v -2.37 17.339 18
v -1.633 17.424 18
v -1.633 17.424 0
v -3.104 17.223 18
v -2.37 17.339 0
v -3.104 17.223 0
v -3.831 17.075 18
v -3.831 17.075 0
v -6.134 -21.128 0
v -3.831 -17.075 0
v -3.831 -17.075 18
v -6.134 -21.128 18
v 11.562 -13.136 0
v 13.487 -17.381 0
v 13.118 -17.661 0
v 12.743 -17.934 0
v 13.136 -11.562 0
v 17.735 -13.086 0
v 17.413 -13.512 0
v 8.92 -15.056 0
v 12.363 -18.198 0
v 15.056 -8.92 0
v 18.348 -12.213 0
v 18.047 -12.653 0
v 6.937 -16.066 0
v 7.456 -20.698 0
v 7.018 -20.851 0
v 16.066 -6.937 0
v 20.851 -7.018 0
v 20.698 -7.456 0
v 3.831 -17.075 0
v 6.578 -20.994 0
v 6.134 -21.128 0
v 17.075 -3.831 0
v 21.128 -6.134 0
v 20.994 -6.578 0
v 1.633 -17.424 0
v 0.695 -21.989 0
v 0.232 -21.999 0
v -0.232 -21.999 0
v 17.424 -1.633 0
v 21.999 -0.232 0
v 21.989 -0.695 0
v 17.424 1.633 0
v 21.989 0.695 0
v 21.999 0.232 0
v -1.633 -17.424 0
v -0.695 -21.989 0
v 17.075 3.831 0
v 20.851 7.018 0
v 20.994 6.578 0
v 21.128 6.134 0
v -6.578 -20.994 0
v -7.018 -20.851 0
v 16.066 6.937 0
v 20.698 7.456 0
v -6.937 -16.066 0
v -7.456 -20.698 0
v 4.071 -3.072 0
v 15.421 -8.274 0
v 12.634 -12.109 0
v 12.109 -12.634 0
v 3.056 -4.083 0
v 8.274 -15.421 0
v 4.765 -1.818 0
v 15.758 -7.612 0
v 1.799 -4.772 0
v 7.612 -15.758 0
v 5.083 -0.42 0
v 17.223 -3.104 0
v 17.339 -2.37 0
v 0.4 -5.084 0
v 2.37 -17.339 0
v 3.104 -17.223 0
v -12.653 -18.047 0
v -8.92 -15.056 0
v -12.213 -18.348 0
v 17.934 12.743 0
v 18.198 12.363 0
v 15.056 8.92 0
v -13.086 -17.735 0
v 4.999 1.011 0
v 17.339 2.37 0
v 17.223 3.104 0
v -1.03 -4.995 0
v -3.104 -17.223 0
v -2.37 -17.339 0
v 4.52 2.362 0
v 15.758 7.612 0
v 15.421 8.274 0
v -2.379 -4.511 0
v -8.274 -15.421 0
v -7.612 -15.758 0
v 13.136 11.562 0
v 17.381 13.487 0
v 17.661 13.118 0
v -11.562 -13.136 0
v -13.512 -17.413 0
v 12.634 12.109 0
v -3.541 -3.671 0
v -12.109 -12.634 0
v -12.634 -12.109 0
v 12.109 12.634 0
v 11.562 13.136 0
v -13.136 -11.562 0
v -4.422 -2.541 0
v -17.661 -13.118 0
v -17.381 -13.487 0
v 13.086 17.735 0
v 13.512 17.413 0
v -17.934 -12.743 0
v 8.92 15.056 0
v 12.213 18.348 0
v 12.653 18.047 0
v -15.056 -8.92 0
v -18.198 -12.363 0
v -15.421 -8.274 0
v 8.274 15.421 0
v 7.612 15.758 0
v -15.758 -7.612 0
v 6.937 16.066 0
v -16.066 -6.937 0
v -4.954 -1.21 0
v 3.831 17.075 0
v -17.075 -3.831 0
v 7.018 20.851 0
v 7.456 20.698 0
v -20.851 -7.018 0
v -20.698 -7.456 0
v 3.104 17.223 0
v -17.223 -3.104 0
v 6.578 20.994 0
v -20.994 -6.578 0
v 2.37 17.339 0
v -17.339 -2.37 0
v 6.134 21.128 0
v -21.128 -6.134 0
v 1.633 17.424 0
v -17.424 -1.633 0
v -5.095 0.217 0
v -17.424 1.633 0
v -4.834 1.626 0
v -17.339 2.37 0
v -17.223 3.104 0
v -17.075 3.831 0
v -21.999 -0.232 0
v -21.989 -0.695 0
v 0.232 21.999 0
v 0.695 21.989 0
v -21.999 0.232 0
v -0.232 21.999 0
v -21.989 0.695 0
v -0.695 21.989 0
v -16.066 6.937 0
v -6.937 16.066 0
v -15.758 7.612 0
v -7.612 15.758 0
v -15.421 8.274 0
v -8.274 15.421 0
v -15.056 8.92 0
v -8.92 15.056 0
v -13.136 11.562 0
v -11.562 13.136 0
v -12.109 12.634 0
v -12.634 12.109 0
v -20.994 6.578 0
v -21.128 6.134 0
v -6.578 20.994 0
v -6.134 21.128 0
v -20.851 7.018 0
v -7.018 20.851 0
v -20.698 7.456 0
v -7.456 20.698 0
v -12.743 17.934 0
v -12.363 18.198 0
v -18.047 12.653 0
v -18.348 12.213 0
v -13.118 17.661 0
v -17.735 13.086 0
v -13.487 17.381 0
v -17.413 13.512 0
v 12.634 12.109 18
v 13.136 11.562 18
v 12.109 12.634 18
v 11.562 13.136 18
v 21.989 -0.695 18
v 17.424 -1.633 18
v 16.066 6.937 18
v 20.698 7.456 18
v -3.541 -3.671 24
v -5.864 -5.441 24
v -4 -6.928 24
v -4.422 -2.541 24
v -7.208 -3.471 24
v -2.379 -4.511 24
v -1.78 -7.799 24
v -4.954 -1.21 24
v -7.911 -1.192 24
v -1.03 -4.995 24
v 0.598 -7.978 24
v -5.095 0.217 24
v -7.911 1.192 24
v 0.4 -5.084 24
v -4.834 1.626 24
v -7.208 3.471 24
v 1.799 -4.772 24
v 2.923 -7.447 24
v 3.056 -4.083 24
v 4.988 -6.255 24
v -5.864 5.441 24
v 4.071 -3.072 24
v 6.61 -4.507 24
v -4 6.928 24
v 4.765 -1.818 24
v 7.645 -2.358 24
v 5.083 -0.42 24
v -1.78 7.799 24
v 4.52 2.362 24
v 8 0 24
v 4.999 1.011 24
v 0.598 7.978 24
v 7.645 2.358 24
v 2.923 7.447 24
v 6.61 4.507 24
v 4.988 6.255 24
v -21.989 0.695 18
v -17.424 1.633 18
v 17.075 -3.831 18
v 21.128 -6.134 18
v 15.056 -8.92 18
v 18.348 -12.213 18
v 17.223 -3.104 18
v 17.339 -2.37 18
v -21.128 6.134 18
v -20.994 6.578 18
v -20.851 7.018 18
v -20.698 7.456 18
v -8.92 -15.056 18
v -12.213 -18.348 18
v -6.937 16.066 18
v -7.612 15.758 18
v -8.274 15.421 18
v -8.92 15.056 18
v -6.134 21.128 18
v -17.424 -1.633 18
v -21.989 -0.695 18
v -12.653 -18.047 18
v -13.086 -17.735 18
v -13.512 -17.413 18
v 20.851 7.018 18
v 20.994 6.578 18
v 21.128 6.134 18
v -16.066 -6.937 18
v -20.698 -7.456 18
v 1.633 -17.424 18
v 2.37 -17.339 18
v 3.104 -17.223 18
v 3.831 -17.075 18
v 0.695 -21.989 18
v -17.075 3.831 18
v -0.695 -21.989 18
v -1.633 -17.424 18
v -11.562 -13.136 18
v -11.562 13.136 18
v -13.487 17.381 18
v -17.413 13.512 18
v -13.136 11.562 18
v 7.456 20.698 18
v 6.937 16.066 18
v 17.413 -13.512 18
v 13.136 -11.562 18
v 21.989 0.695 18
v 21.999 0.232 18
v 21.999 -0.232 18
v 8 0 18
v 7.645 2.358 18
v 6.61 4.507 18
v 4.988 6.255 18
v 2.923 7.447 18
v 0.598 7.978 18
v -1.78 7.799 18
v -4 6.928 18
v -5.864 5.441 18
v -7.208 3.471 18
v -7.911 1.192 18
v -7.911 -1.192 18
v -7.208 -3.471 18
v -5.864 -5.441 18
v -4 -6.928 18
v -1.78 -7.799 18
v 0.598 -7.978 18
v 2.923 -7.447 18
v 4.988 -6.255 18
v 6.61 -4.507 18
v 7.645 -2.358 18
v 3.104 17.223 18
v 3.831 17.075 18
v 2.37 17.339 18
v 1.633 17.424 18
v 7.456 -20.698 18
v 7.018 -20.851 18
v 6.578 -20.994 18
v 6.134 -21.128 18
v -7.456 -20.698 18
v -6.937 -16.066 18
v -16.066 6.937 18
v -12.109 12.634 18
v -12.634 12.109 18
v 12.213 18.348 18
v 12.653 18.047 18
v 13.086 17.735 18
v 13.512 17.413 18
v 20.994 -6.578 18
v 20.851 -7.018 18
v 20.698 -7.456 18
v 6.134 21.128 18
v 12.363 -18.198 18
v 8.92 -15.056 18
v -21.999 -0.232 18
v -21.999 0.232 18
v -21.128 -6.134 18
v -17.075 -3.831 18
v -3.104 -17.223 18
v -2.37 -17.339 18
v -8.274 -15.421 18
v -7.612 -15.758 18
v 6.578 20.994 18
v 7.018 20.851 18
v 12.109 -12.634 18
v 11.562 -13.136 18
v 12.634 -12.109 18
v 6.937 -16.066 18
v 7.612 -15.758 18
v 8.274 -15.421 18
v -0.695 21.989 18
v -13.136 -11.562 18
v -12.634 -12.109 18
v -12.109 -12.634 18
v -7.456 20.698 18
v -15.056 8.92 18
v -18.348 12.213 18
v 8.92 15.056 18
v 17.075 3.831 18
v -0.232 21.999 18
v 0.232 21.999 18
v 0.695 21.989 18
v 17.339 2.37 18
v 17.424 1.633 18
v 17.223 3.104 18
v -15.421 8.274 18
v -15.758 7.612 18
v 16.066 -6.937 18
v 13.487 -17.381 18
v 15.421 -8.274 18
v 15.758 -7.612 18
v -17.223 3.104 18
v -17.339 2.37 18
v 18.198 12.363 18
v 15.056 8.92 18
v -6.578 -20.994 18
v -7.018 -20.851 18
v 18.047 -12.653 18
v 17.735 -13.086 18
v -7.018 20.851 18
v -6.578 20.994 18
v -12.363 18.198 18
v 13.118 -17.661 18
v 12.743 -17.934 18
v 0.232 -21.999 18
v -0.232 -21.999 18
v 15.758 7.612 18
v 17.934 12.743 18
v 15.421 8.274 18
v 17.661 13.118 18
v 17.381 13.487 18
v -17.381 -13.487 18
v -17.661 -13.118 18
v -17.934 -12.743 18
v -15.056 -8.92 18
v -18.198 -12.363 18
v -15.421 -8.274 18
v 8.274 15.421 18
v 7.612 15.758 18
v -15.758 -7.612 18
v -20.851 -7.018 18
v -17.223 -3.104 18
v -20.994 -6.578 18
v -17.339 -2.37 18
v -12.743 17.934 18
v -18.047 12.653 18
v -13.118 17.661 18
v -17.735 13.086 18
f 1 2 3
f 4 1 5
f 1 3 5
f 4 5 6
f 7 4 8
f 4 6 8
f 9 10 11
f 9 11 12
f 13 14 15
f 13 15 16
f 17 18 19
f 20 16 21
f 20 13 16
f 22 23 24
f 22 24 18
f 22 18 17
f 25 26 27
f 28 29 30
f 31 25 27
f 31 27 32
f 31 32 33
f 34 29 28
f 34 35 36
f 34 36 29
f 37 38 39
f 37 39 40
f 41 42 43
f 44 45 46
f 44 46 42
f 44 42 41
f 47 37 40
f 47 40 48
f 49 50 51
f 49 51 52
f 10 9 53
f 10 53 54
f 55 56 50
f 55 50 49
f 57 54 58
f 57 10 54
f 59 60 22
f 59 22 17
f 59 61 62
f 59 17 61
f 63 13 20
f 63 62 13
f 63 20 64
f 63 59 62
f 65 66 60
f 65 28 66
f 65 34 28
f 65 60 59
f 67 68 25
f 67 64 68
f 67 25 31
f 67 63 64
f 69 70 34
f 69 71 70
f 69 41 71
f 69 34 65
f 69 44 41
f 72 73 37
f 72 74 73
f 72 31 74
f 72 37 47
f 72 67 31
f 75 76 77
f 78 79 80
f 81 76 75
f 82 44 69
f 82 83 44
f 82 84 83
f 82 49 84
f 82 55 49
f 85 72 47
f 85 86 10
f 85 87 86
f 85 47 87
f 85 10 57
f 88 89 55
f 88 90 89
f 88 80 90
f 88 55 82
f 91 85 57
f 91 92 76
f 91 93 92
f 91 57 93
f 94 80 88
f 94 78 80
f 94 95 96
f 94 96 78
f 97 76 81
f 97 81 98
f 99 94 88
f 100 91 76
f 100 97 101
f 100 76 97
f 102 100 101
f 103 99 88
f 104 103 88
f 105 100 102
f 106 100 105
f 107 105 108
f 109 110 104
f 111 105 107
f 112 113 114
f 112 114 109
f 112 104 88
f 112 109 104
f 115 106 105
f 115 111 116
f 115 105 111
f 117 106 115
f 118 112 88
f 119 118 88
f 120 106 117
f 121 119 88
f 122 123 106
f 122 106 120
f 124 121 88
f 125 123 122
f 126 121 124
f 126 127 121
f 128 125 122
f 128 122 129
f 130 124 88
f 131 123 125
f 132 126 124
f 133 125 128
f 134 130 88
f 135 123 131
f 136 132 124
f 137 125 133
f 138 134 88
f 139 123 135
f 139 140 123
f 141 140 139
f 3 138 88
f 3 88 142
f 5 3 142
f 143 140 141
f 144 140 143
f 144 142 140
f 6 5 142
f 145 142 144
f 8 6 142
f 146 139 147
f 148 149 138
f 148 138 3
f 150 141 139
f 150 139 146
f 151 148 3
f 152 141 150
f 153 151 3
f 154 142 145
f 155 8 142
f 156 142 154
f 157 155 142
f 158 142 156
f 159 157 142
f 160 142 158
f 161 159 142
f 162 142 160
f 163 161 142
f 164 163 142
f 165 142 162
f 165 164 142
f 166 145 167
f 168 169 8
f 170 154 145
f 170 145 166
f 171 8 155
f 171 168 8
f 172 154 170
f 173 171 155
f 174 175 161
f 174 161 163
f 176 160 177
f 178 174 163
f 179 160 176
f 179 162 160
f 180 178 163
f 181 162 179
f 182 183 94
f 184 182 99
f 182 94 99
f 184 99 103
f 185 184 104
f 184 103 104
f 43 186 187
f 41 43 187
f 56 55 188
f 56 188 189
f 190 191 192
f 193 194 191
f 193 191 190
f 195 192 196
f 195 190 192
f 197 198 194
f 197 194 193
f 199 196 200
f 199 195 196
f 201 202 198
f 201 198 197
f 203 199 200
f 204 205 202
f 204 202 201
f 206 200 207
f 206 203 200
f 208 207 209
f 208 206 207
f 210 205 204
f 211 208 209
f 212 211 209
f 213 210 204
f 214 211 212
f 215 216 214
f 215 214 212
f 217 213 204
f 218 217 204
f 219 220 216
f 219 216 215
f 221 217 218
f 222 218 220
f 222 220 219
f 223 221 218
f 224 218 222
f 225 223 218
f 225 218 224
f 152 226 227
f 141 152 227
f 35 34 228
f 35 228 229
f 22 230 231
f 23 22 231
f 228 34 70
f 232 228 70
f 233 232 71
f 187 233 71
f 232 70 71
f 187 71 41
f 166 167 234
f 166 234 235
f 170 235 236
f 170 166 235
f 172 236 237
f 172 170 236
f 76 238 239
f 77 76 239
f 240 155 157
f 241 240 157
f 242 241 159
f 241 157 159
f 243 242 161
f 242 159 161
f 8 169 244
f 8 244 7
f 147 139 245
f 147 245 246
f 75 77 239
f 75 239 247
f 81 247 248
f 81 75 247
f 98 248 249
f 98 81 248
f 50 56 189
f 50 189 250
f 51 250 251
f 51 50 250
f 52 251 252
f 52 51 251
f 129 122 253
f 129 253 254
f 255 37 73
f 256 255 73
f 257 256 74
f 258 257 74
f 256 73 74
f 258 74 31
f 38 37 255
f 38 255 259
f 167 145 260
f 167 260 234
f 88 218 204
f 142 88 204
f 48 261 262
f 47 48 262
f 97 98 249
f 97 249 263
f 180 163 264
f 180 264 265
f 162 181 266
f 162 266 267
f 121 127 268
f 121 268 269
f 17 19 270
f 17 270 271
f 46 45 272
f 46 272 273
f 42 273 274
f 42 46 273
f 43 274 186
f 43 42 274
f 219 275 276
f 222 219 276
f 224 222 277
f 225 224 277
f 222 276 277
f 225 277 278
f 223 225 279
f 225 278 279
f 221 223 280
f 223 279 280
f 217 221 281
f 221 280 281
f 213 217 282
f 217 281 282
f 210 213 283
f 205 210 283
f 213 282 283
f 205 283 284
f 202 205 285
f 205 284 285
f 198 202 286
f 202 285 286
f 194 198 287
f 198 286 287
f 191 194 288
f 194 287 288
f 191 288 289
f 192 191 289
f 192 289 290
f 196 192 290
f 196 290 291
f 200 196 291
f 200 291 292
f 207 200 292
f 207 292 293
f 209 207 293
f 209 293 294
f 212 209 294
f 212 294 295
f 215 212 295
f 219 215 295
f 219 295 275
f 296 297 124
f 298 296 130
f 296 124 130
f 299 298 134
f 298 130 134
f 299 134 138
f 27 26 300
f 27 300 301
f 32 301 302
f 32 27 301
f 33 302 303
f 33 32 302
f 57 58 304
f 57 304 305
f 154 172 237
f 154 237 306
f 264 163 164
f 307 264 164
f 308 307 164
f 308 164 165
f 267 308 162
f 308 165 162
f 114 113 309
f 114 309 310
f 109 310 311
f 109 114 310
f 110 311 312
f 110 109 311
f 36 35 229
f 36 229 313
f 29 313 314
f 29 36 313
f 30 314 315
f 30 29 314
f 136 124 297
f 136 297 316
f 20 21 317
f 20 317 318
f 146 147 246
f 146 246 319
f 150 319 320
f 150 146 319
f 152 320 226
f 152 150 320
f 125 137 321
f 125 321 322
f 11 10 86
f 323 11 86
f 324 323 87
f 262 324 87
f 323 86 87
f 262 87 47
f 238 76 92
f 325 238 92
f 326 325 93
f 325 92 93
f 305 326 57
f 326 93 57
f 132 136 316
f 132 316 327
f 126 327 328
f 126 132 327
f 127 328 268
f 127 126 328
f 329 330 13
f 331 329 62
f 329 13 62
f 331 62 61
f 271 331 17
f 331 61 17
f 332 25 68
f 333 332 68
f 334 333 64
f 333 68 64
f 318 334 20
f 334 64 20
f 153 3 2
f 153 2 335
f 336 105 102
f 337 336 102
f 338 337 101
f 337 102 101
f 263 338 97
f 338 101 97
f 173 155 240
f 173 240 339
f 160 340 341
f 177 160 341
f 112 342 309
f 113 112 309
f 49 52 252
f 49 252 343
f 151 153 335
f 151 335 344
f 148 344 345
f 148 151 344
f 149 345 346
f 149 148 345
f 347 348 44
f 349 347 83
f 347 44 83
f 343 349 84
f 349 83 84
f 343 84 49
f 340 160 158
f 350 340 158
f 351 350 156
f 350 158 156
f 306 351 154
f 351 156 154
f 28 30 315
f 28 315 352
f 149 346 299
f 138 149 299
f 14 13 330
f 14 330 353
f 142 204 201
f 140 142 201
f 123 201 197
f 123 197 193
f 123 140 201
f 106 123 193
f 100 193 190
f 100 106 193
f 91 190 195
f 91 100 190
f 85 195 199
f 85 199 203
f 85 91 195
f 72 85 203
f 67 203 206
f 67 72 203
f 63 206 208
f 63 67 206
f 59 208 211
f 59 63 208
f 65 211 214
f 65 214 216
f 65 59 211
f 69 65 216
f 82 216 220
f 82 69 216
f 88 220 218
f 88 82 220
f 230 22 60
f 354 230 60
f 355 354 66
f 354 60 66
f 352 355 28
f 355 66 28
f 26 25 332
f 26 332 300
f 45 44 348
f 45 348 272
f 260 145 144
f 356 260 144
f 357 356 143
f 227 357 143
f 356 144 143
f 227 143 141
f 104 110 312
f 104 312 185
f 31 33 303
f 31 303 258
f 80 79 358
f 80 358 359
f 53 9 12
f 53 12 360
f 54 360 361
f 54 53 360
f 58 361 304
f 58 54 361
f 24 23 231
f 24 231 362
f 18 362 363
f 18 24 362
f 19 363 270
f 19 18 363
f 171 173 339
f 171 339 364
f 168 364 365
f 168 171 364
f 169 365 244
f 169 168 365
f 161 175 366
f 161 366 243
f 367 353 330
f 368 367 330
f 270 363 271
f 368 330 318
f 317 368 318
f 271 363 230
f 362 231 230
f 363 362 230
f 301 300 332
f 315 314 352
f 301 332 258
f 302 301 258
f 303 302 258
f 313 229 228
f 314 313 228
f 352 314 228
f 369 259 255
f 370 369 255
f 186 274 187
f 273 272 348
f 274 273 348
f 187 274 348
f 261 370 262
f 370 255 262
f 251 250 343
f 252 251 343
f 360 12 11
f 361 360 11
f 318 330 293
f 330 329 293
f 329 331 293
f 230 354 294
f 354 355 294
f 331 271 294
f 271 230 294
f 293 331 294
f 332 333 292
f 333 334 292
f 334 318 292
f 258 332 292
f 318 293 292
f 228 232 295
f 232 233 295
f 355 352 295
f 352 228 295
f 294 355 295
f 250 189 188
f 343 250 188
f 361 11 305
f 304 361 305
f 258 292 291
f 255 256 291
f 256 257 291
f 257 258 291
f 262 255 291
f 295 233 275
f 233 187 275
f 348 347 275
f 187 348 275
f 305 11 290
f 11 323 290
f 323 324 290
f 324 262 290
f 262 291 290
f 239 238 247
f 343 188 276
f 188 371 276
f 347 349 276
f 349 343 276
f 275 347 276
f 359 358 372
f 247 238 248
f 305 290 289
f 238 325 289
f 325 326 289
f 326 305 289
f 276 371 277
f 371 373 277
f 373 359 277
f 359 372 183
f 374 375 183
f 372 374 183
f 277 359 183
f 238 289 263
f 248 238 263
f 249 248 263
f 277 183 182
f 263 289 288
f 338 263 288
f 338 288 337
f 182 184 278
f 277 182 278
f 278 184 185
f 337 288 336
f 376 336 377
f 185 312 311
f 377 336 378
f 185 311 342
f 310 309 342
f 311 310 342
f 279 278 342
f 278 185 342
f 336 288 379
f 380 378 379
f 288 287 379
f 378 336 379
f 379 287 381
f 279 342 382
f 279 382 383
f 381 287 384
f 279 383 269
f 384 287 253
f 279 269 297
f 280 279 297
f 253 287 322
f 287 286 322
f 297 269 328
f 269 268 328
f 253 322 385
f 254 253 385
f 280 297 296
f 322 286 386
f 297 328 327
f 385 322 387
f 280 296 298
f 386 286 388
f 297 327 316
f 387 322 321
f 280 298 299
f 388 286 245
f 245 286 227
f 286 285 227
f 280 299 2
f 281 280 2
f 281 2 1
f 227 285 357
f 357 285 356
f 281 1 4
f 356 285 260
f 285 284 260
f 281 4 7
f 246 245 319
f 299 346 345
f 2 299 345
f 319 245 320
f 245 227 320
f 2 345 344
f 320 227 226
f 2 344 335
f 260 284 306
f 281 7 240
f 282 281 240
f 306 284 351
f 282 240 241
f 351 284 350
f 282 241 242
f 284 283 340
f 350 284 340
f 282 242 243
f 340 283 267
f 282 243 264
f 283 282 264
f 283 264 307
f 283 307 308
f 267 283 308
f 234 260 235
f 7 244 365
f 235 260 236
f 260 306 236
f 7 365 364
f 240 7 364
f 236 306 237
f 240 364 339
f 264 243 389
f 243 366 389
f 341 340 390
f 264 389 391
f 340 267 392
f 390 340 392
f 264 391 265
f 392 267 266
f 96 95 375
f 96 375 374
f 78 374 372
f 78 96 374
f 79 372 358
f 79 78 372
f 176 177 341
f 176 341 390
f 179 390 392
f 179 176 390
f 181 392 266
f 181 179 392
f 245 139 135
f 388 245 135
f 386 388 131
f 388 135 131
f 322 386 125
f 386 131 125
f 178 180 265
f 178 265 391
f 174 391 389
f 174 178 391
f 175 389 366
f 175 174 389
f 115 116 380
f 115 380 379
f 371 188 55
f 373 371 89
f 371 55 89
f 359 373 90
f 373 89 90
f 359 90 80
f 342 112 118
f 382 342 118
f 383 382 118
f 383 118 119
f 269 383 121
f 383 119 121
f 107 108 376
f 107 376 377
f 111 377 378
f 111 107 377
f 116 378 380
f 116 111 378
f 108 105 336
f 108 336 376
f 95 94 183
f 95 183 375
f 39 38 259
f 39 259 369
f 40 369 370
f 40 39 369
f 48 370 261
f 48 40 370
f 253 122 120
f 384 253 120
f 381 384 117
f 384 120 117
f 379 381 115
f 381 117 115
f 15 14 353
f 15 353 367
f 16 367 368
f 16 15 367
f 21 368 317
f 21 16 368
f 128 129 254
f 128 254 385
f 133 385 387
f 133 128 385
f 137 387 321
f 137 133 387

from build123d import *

# Parameters (mm, degrees)
SKETCH_1_R       = 8
EXTRUDE_1_DEPTH  = 24
SKETCH_2_R       = 17.5
SKETCH_2_R_2     = 8
EXTRUDE_2_DEPTH  = 18
EXTRUDE_3_DEPTH  = 18
EXTRUDE_4_DEPTH  = 18
EXTRUDE_5_DEPTH  = 18
EXTRUDE_6_DEPTH  = 18
EXTRUDE_7_DEPTH  = 18
EXTRUDE_8_DEPTH  = 18
EXTRUDE_9_DEPTH  = 18
EXTRUDE_10_DEPTH = 18
EXTRUDE_11_DEPTH = 18
EXTRUDE_12_DEPTH = 18
EXTRUDE_13_DEPTH = 18
EXTRUDE_14_DEPTH = 18
EXTRUDE_15_DEPTH = 18
EXTRUDE_16_DEPTH = 18
EXTRUDE_17_DEPTH = 18
EXTRUDE_18_DEPTH = 18
EXTRUDE_19_DEPTH = 18
EXTRUDE_20_DEPTH = 18
EXTRUDE_21_DEPTH = 18
EXTRUDE_22_DEPTH = 18


with BuildPart() as part:
    # 草图1 → 凸台-拉伸1 (new body)
    with BuildSketch(Plane.XY):
        Circle(SKETCH_1_R)
        with BuildLine():
            Line((4.520101179, 2.361924075), (-4.833937562, 1.62574526))
            ThreePointArc((-4.833937562, 1.62574526), (0.400141388, -5.084278402), (4.520101179, 2.361924075))
        make_face(mode=Mode.SUBTRACT)
    extrude(amount=EXTRUDE_1_DEPTH)

    # 草图2 → 凸台-拉伸2 (add)
    with BuildSketch(Plane.XY):
        Circle(SKETCH_2_R)
        Circle(SKETCH_2_R_2, mode=Mode.SUBTRACT)
    extrude(amount=EXTRUDE_2_DEPTH)

    # 草图3 → 凸台-拉伸3 (add)
    with BuildSketch(Plane.XY):
        with BuildLine():
            Line((17.423652167, 1.632894724), (21.989026862, 0.69476445))
            ThreePointArc((21.989026862, 0.69476445), (22, 0), (21.989026862, -0.69476445))
            Line((21.989026862, -0.69476445), (17.423652167, -1.632894724))
            ThreePointArc((17.423652167, -1.632894724), (17.5, 0), (17.423652167, 1.632894724))
        make_face()
    extrude(amount=EXTRUDE_3_DEPTH)

    # 草图4 → 凸台-拉伸4 (add)
    with BuildSketch(Plane.XY):
        with BuildLine():
            Line((16.066285711, 6.937179791), (20.698113262, 7.455743248))
            ThreePointArc((20.698113262, 7.455743248), (20.923243358, 6.798373876), (21.127501307, 6.134222733))
            Line((21.127501307, 6.134222733), (17.07547015, 3.831229456))
            ThreePointArc((17.07547015, 3.831229456), (16.643489035, 5.407797402), (16.066285711, 6.937179791))
        make_face()
    extrude(amount=EXTRUDE_4_DEPTH)

    # 草图5 → 凸台-拉伸5 (add)
    with BuildSketch(Plane.XY):
        with BuildLine():
            Line((13.13623927, 11.562405366), (17.381124124, 13.486901949))
            ThreePointArc((17.381124124, 13.486901949), (17.798373876, 12.93127555), (18.197868719, 12.362749455))
            Line((18.197868719, 12.362749455), (15.055822144, 8.920326203))
            ThreePointArc((15.055822144, 8.920326203), (14.157797402, 10.286241915), (13.13623927, 11.562405366))
        make_face()
    extrude(amount=EXTRUDE_5_DEPTH)

    # 草图6 → 凸台-拉伸6 (add)
    with BuildSketch(Plane.XY):
        with BuildLine():
            Line((8.920326203, 15.055822144), (12.212561116, 18.348057057))
            ThreePointArc((12.212561116, 18.348057057), (12.870731845, 17.892515435), (13.511927681, 17.413375811))
            Line((13.511927681, 17.413375811), (11.562405366, 13.13623927))
            ThreePointArc((11.562405366, 13.13623927), (10.286241915, 14.157797402), (8.920326203, 15.055822144))
        make_face()
    extrude(amount=EXTRUDE_6_DEPTH)

    # 草图7 → 凸台-拉伸7 (add)
    with BuildSketch(Plane.XY):
        with BuildLine():
            Line((3.831229456, 17.07547015), (6.134222733, 21.127501307))
            ThreePointArc((6.134222733, 21.127501307), (6.798373876, 20.923243358), (7.455743248, 20.698113262))
            Line((7.455743248, 20.698113262), (6.937179791, 16.066285711))
            ThreePointArc((6.937179791, 16.066285711), (5.407797402, 16.643489035), (3.831229456, 17.07547015))
        make_face()
    extrude(amount=EXTRUDE_7_DEPTH)

    # 草图8 → 凸台-拉伸8 (add)
    with BuildSketch(Plane.XY):
        with BuildLine():
            Line((-1.632894724, 17.423652167), (-0.69476445, 21.989026862))
            ThreePointArc((-0.69476445, 21.989026862), (0, 22), (0.69476445, 21.989026862))
            Line((0.69476445, 21.989026862), (1.632894724, 17.423652167))
            ThreePointArc((1.632894724, 17.423652167), (0, 17.5), (-1.632894724, 17.423652167))
        make_face()
    extrude(amount=EXTRUDE_8_DEPTH)

    # 草图9 → 凸台-拉伸9 (add)
    with BuildSketch(Plane.XY):
        with BuildLine():
            Line((-6.937179791, 16.066285711), (-7.455743248, 20.698113262))
            ThreePointArc((-7.455743248, 20.698113262), (-6.798373876, 20.923243358), (-6.134222733, 21.127501307))
            Line((-6.134222733, 21.127501307), (-3.831229456, 17.07547015))
            ThreePointArc((-3.831229456, 17.07547015), (-5.407797402, 16.643489035), (-6.937179791, 16.066285711))
        make_face()
    extrude(amount=EXTRUDE_9_DEPTH)

    # 草图10 → 凸台-拉伸10 (add)
    with BuildSketch(Plane.XY):
        with BuildLine():
            Line((-11.562405366, 13.13623927), (-13.486901949, 17.381124124))
            ThreePointArc((-13.486901949, 17.381124124), (-12.93127555, 17.798373876), (-12.362749455, 18.197868719))
            Line((-12.362749455, 18.197868719), (-8.920326203, 15.055822144))
            ThreePointArc((-8.920326203, 15.055822144), (-10.286241915, 14.157797402), (-11.562405366, 13.13623927))
        make_face()
    extrude(amount=EXTRUDE_10_DEPTH)

    # 草图11 → 凸台-拉伸11 (add)
    with BuildSketch(Plane.XY):
        with BuildLine():
            Line((-15.055822144, 8.920326203), (-18.348057057, 12.212561116))
            ThreePointArc((-18.348057057, 12.212561116), (-17.892515435, 12.870731845), (-17.413375811, 13.511927681))
            Line((-17.413375811, 13.511927681), (-13.13623927, 11.562405366))
            ThreePointArc((-13.13623927, 11.562405366), (-14.157797402, 10.286241915), (-15.055822144, 8.920326203))
        make_face()
    extrude(amount=EXTRUDE_11_DEPTH)

    # 草图12 → 凸台-拉伸12 (add)
    with BuildSketch(Plane.XY):
        with BuildLine():
            Line((-17.07547015, 3.831229456), (-21.127501307, 6.134222733))
            ThreePointArc((-21.127501307, 6.134222733), (-20.923243358, 6.798373876), (-20.698113262, 7.455743248))
            Line((-20.698113262, 7.455743248), (-16.066285711, 6.937179791))
            ThreePointArc((-16.066285711, 6.937179791), (-16.643489035, 5.407797402), (-17.07547015, 3.831229456))
        make_face()
    extrude(amount=EXTRUDE_12_DEPTH)

    # 草图13 → 凸台-拉伸13 (add)
    with BuildSketch(Plane.XY):
        with BuildLine():
            Line((-17.423652167, -1.632894724), (-21.989026862, -0.69476445))
            ThreePointArc((-21.989026862, -0.69476445), (-22, 0), (-21.989026862, 0.69476445))
            Line((-21.989026862, 0.69476445), (-17.423652167, 1.632894724))
            ThreePointArc((-17.423652167, 1.632894724), (-17.5, 0), (-17.423652167, -1.632894724))
        make_face()
    extrude(amount=EXTRUDE_13_DEPTH)

    # 草图14 → 凸台-拉伸14 (add)
    with BuildSketch(Plane.XY):
        with BuildLine():
            Line((-16.066285711, -6.937179791), (-20.698113262, -7.455743248))
            ThreePointArc((-20.698113262, -7.455743248), (-20.923243358, -6.798373876), (-21.127501307, -6.134222733))
            Line((-21.127501307, -6.134222733), (-17.07547015, -3.831229456))
            ThreePointArc((-17.07547015, -3.831229456), (-16.643489035, -5.407797402), (-16.066285711, -6.937179791))
        make_face()
    extrude(amount=EXTRUDE_14_DEPTH)

    # 草图15 → 凸台-拉伸15 (add)
    with BuildSketch(Plane.XY):
        with BuildLine():
            Line((-13.13623927, -11.562405366), (-17.381124124, -13.486901949))
            ThreePointArc((-17.381124124, -13.486901949), (-17.798373876, -12.93127555), (-18.197868719, -12.362749455))
            Line((-18.197868719, -12.362749455), (-15.055822144, -8.920326203))
            ThreePointArc((-15.055822144, -8.920326203), (-14.157797402, -10.286241915), (-13.13623927, -11.562405366))
        make_face()
    extrude(amount=EXTRUDE_15_DEPTH)

    # 草图16 → 凸台-拉伸16 (add)
    with BuildSketch(Plane.XY):
        with BuildLine():
            Line((-8.920326203, -15.055822144), (-12.212561116, -18.348057057))
            ThreePointArc((-12.212561116, -18.348057057), (-12.870731845, -17.892515435), (-13.511927681, -17.413375811))
            Line((-13.511927681, -17.413375811), (-11.562405366, -13.13623927))
            ThreePointArc((-11.562405366, -13.13623927), (-10.286241915, -14.157797402), (-8.920326203, -15.055822144))
        make_face()
    extrude(amount=EXTRUDE_16_DEPTH)

    # 草图17 → 凸台-拉伸17 (add)
    with BuildSketch(Plane.XY):
        with BuildLine():
            Line((-3.831229456, -17.07547015), (-6.134222733, -21.127501307))
            ThreePointArc((-6.134222733, -21.127501307), (-6.798373876, -20.923243358), (-7.455743248, -20.698113262))
            Line((-7.455743248, -20.698113262), (-6.937179791, -16.066285711))
            ThreePointArc((-6.937179791, -16.066285711), (-5.407797402, -16.643489035), (-3.831229456, -17.07547015))
        make_face()
    extrude(amount=EXTRUDE_17_DEPTH)

    # 草图18 → 凸台-拉伸18 (add)
    with BuildSketch(Plane.XY):
        with BuildLine():
            Line((1.632894724, -17.423652167), (0.69476445, -21.989026862))
            ThreePointArc((0.69476445, -21.989026862), (0, -22), (-0.69476445, -21.989026862))
            Line((-0.69476445, -21.989026862), (-1.632894724, -17.423652167))
            ThreePointArc((-1.632894724, -17.423652167), (0, -17.5), (1.632894724, -17.423652167))
        make_face()
    extrude(amount=EXTRUDE_18_DEPTH)

    # 草图19 → 凸台-拉伸19 (add)
    with BuildSketch(Plane.XY):
        with BuildLine():
            Line((6.937179791, -16.066285711), (7.455743248, -20.698113262))
            ThreePointArc((7.455743248, -20.698113262), (6.798373876, -20.923243358), (6.134222733, -21.127501307))
            Line((6.134222733, -21.127501307), (3.831229456, -17.07547015))
            ThreePointArc((3.831229456, -17.07547015), (5.407797402, -16.643489035), (6.937179791, -16.066285711))
        make_face()
    extrude(amount=EXTRUDE_19_DEPTH)

    # 草图20 → 凸台-拉伸20 (add)
    with BuildSketch(Plane.XY):
        with BuildLine():
            Line((11.562405366, -13.13623927), (13.486901949, -17.381124124))
            ThreePointArc((13.486901949, -17.381124124), (12.93127555, -17.798373876), (12.362749455, -18.197868719))
            Line((12.362749455, -18.197868719), (8.920326203, -15.055822144))
            ThreePointArc((8.920326203, -15.055822144), (10.286241915, -14.157797402), (11.562405366, -13.13623927))
        make_face()
    extrude(amount=EXTRUDE_20_DEPTH)

    # 草图21 → 凸台-拉伸21 (add)
    with BuildSketch(Plane.XY):
        with BuildLine():
            Line((15.055822144, -8.920326203), (18.348057057, -12.212561116))
            ThreePointArc((18.348057057, -12.212561116), (17.892515435, -12.870731845), (17.413375811, -13.511927681))
            Line((17.413375811, -13.511927681), (13.13623927, -11.562405366))
            ThreePointArc((13.13623927, -11.562405366), (14.157797402, -10.286241915), (15.055822144, -8.920326203))
        make_face()
    extrude(amount=EXTRUDE_21_DEPTH)

    # 草图22 → 凸台-拉伸22 (add)
    with BuildSketch(Plane.XY):
        with BuildLine():
            Line((17.07547015, -3.831229456), (21.127501307, -6.134222733))
            ThreePointArc((21.127501307, -6.134222733), (20.923243358, -6.798373876), (20.698113262, -7.455743248))
            Line((20.698113262, -7.455743248), (16.066285711, -6.937179791))
            ThreePointArc((16.066285711, -6.937179791), (16.643489035, -5.407797402), (17.07547015, -3.831229456))
        make_face()
    extrude(amount=EXTRUDE_22_DEPTH)


solid = part.part
